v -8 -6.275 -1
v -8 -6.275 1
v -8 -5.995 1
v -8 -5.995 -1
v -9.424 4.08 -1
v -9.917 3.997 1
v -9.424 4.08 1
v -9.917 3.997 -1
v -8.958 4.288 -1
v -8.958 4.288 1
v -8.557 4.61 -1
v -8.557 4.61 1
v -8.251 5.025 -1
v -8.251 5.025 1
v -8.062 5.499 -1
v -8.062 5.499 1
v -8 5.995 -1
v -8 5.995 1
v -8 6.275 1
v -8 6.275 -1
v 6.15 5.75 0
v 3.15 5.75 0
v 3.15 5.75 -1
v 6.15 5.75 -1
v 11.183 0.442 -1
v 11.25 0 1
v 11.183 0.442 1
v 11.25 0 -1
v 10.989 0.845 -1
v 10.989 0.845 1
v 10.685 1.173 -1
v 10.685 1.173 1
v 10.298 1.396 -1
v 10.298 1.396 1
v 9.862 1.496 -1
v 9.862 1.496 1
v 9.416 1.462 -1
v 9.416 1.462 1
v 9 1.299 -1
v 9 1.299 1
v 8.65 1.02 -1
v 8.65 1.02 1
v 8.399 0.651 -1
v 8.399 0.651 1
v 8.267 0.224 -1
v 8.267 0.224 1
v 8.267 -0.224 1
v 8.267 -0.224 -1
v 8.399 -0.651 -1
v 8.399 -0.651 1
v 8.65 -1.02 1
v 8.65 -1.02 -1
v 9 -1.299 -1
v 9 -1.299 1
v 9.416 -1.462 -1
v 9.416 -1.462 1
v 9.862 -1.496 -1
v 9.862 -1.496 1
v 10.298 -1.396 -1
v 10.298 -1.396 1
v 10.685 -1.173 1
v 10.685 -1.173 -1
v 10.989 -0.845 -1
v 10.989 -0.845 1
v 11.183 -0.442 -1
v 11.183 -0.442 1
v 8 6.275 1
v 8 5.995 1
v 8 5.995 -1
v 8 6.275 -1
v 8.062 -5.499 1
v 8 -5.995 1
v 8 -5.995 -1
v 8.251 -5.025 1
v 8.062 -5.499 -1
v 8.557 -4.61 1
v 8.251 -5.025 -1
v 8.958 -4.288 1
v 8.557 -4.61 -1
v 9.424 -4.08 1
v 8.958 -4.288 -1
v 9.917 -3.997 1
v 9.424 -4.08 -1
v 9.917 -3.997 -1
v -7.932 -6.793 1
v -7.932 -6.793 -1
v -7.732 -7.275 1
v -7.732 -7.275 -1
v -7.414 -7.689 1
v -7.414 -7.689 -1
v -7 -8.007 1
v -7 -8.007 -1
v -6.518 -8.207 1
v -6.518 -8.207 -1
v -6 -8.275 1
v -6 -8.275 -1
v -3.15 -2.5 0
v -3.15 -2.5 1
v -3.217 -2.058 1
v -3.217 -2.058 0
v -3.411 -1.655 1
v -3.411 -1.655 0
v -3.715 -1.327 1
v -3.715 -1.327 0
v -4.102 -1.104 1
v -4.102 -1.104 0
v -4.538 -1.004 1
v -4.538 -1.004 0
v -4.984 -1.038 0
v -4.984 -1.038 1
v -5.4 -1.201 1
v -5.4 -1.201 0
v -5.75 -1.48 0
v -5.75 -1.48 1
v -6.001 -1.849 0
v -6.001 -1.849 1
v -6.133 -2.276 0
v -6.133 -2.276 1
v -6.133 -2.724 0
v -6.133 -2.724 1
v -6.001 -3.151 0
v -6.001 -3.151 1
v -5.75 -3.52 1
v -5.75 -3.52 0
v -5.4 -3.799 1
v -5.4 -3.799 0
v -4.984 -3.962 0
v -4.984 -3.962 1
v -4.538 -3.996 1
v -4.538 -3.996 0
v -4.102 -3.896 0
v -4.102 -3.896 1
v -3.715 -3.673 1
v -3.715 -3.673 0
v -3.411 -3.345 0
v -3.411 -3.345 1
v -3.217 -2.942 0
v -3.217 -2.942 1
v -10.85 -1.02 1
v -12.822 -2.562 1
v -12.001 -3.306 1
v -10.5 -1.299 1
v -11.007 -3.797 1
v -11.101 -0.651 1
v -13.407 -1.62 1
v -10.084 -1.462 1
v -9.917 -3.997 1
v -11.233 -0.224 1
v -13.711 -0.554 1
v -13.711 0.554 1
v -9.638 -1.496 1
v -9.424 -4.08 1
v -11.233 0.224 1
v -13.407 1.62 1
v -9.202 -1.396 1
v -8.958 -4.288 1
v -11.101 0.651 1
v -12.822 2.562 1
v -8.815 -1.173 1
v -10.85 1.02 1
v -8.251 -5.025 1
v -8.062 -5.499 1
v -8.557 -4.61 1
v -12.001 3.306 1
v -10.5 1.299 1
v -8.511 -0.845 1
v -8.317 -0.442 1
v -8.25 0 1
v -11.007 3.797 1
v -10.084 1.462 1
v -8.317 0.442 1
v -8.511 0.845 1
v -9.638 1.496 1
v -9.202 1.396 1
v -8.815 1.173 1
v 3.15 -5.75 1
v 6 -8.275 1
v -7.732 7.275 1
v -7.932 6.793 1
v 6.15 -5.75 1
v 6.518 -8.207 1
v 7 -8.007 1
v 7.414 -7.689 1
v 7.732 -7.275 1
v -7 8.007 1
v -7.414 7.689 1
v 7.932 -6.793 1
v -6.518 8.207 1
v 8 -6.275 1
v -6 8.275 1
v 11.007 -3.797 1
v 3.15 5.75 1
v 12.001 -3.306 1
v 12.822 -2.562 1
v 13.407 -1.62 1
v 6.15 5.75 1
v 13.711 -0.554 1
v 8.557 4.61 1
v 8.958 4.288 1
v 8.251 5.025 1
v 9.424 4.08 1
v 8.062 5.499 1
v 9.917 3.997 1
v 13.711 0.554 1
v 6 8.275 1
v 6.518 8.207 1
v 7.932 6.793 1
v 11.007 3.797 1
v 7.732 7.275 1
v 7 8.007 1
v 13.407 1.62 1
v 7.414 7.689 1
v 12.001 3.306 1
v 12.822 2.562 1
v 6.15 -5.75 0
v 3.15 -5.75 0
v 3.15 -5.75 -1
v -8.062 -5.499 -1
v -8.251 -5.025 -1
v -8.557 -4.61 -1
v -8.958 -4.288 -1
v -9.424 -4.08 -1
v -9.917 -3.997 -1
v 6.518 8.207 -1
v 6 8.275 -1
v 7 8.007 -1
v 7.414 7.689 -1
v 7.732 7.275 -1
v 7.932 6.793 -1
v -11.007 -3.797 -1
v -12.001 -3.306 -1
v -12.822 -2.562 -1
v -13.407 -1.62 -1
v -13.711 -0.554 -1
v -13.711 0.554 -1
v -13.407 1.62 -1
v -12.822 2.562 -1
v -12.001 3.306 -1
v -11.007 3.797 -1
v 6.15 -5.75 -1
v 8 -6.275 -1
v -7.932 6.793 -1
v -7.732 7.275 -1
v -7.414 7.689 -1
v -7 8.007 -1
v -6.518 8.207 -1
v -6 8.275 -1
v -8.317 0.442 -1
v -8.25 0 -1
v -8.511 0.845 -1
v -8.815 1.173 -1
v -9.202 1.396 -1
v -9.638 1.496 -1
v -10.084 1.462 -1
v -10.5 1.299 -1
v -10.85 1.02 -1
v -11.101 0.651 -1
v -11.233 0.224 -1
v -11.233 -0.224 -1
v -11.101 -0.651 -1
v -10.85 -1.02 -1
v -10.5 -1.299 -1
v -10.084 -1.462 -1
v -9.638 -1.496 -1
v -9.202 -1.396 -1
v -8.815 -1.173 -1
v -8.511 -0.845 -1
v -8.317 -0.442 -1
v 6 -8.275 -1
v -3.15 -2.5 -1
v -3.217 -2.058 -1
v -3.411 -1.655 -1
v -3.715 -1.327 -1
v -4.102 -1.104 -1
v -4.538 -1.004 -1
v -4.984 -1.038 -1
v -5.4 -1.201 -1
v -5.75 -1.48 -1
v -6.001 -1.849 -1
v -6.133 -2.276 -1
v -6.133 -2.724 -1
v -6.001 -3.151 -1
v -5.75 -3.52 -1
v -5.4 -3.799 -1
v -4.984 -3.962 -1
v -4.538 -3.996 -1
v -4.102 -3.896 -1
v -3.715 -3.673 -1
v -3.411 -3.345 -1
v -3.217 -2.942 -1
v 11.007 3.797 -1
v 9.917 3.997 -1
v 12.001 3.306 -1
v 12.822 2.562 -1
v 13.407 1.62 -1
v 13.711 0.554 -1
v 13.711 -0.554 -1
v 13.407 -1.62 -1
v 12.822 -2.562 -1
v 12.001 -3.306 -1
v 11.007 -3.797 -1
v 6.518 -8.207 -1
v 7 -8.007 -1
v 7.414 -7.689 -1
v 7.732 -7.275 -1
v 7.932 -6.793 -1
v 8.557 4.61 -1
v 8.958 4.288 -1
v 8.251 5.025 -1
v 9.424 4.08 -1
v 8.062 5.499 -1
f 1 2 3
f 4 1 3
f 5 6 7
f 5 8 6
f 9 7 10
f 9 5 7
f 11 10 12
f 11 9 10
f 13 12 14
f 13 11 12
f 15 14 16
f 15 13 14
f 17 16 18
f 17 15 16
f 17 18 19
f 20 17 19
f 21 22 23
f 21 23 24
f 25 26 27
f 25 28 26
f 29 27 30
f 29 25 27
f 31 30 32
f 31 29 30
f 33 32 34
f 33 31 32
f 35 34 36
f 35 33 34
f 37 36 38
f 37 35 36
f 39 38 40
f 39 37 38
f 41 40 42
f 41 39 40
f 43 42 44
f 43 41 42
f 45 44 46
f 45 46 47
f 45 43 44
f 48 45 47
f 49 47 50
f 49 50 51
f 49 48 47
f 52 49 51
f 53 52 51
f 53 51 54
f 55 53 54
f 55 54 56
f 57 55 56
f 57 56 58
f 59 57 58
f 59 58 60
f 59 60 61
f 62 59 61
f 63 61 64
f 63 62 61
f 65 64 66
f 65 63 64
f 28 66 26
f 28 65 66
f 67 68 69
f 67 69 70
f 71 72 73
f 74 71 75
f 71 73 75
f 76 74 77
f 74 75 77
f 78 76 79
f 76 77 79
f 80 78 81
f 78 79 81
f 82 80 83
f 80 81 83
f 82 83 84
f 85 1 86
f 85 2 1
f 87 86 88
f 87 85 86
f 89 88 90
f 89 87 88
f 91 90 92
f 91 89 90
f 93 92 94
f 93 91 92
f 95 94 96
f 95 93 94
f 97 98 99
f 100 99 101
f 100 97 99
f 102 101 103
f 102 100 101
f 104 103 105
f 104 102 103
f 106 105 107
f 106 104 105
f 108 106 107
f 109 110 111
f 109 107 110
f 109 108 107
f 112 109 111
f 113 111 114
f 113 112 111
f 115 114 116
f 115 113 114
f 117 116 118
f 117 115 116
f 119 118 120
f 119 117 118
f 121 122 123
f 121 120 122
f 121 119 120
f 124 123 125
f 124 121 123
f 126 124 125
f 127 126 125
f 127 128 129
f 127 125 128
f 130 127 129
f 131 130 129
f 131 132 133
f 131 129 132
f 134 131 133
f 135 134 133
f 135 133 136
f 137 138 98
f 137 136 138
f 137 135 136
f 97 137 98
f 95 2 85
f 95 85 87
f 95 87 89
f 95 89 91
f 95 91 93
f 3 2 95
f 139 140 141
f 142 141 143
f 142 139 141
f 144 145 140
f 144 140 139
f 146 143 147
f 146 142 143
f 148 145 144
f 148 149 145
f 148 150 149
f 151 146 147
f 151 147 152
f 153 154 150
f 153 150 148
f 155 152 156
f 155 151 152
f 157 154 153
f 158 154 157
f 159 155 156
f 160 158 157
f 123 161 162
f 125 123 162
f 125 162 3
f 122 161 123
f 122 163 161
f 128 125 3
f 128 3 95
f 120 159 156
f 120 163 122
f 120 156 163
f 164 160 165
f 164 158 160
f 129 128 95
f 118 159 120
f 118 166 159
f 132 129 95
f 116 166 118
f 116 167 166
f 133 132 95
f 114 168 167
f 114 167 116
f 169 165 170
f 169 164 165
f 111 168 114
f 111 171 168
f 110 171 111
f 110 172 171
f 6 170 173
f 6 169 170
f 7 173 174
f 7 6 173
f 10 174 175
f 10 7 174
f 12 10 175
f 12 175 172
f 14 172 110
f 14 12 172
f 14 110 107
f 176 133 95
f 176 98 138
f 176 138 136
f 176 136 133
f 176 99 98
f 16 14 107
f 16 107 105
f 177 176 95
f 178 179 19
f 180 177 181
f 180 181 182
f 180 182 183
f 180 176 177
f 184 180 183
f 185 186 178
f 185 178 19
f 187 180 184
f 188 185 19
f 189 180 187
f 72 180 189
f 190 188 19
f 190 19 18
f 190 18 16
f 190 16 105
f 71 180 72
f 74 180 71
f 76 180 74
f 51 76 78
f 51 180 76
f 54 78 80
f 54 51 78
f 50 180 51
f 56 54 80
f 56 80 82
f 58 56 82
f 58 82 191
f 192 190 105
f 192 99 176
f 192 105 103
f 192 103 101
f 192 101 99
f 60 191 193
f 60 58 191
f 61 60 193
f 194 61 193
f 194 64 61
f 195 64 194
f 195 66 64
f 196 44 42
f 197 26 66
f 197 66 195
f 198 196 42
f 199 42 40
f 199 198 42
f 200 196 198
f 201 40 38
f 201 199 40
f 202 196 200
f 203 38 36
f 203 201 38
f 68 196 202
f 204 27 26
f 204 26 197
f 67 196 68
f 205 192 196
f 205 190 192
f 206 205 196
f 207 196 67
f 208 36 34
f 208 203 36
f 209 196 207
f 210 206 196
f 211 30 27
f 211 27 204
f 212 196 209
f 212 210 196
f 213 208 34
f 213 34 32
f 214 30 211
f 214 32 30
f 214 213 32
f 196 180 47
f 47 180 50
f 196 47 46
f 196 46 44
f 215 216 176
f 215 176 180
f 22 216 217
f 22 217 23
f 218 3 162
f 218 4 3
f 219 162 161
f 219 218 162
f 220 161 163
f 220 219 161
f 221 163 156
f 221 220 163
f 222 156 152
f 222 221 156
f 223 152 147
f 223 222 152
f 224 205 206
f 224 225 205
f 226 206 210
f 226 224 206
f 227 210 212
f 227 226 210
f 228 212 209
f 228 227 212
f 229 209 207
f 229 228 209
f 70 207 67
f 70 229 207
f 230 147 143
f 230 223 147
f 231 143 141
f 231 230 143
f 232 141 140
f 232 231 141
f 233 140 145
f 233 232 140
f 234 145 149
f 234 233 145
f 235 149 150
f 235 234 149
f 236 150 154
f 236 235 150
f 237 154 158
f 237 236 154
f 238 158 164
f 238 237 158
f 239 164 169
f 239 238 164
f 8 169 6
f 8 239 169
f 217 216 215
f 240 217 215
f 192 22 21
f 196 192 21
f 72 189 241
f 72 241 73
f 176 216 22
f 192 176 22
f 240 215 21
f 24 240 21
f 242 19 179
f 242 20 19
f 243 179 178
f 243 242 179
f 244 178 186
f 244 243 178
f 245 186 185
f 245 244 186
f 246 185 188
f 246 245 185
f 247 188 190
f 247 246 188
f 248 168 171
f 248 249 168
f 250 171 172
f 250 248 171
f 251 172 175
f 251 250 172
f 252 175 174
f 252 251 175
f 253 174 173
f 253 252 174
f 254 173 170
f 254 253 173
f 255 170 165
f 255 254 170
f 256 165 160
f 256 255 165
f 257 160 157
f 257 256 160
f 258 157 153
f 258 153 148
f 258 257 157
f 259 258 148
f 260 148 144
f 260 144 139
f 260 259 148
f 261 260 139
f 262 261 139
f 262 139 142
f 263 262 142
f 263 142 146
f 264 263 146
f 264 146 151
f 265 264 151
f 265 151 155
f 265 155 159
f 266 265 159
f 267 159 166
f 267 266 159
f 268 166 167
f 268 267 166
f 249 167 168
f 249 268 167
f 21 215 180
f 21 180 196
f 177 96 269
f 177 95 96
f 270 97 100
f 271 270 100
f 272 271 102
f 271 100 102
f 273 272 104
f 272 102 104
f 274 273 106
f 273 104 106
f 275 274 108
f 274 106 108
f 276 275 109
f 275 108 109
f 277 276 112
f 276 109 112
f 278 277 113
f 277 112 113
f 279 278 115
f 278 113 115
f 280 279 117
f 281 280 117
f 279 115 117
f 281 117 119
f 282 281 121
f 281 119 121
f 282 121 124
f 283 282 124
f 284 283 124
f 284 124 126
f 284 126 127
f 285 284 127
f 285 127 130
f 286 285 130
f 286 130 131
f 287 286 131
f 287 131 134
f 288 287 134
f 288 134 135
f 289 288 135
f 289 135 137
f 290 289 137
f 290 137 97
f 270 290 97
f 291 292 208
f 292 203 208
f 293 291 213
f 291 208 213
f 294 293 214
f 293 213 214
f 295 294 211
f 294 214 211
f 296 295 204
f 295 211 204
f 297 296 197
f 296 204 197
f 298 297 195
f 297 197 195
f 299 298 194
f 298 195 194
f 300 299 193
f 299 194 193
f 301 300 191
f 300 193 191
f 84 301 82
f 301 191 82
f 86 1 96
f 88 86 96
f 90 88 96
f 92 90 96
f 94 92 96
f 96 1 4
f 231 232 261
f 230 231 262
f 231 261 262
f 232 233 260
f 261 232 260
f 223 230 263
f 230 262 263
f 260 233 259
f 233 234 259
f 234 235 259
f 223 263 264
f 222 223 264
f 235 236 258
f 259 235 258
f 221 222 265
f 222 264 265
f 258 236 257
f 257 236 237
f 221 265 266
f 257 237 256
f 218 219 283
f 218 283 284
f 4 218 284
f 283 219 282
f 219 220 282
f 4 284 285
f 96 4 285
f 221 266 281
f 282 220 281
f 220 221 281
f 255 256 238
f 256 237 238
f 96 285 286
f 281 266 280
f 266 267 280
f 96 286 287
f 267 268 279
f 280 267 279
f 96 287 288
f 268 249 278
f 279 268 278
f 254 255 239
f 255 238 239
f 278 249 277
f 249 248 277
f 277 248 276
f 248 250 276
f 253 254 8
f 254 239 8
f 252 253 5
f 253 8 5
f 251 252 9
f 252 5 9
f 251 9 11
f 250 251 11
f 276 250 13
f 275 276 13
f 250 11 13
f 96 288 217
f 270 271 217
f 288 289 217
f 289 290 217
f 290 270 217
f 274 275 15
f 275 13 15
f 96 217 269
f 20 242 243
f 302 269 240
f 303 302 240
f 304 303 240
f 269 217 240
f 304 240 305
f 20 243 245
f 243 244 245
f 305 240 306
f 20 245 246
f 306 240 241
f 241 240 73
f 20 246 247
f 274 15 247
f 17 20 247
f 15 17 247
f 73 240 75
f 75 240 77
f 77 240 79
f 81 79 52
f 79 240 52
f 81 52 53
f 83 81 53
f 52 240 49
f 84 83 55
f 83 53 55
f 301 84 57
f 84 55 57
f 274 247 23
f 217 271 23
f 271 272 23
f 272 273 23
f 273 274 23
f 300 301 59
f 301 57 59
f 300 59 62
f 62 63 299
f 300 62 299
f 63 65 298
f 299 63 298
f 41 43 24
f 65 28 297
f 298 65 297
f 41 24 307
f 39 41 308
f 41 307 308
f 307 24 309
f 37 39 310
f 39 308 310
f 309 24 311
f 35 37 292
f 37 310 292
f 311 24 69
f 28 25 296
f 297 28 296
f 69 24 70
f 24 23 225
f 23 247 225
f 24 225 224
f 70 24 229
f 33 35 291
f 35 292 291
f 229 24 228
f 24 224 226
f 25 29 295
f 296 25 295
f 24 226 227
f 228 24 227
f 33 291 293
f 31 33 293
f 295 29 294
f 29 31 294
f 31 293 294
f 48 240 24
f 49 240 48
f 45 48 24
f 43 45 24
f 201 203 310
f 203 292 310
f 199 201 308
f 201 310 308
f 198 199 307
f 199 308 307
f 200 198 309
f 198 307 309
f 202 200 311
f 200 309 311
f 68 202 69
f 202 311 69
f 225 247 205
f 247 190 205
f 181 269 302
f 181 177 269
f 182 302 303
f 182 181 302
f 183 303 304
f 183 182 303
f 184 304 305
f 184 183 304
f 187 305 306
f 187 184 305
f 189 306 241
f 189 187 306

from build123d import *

# Parameters (mm, degrees)
SKETCH1_W               = 16
SKETCH1_H               = 16.55
BOSS_EXTRUDE1_DEPTH     = 1
SKETCH2_R               = 1.5
BOSS_EXTRUDE2_DEPTH     = 1
SKETCH3_R               = 1.5
SKETCH3_W               = 3
SKETCH3_H               = 11.5
CUT_EXTRUDE1_DEPTH      = 2
CUT_EXTRUDE1_DEPTH_BACK = 2
FILLET1_R               = 2


with BuildPart() as part:
    # Sketch1 → Boss-Extrude1 (new body, symmetric)
    with BuildSketch(Plane.XY):
        Rectangle(SKETCH1_W, SKETCH1_H)
    extrude(amount=BOSS_EXTRUDE1_DEPTH, both=True)

    # Sketch2 → Boss-Extrude2 (add, symmetric)
    with BuildSketch(Plane.XY):
        with BuildLine():
            Line((-9.75, 4), (-8, 4))
            Line((-8, 4), (-8, -4))
            Line((-8, -4), (-9.75, -4))
            ThreePointArc((-9.75, -4), (-13.75, 0), (-9.75, 4))
        make_face()
        with Locations((-9.75, 0)):
            Circle(SKETCH2_R, mode=Mode.SUBTRACT)
        with BuildLine():
            Line((9.75, -4), (8, -4))
            Line((8, -4), (8, 4))
            Line((8, 4), (9.75, 4))
            ThreePointArc((9.75, 4), (13.75, 0), (9.75, -4))
        make_face()
        with Locations((9.75, 0)):
            Circle(SKETCH2_R, mode=Mode.SUBTRACT)
    extrude(amount=BOSS_EXTRUDE2_DEPTH, both=True)

    # Sketch3 → Cut-Extrude1 (cut, two sides)
    with BuildSketch(Plane.XY) as cut_extrude1_sk:
        with Locations((-4.65, -2.5)):
            Circle(SKETCH3_R)
        with Locations((4.65, 0)):
            Rectangle(SKETCH3_W, SKETCH3_H)
    extrude(amount=CUT_EXTRUDE1_DEPTH, mode=Mode.SUBTRACT)
    extrude(cut_extrude1_sk.sketch, amount=-CUT_EXTRUDE1_DEPTH_BACK, mode=Mode.SUBTRACT)

    # Fillet1
    fillet1_edges = [part.edges().sort_by_distance(p)[0] for p in [
        (-8, -8.275, 0),
        (-8, -4, 0),
        (8, -8.275, 0),
        (8, -4, 0),
        (8, 4, 0),
        (8, 8.275, 0),
        (-8, 8.275, 0),
        (-8, 4, 0),
    ]]
    fillet(fillet1_edges, radius=FILLET1_R)


solid = part.part
